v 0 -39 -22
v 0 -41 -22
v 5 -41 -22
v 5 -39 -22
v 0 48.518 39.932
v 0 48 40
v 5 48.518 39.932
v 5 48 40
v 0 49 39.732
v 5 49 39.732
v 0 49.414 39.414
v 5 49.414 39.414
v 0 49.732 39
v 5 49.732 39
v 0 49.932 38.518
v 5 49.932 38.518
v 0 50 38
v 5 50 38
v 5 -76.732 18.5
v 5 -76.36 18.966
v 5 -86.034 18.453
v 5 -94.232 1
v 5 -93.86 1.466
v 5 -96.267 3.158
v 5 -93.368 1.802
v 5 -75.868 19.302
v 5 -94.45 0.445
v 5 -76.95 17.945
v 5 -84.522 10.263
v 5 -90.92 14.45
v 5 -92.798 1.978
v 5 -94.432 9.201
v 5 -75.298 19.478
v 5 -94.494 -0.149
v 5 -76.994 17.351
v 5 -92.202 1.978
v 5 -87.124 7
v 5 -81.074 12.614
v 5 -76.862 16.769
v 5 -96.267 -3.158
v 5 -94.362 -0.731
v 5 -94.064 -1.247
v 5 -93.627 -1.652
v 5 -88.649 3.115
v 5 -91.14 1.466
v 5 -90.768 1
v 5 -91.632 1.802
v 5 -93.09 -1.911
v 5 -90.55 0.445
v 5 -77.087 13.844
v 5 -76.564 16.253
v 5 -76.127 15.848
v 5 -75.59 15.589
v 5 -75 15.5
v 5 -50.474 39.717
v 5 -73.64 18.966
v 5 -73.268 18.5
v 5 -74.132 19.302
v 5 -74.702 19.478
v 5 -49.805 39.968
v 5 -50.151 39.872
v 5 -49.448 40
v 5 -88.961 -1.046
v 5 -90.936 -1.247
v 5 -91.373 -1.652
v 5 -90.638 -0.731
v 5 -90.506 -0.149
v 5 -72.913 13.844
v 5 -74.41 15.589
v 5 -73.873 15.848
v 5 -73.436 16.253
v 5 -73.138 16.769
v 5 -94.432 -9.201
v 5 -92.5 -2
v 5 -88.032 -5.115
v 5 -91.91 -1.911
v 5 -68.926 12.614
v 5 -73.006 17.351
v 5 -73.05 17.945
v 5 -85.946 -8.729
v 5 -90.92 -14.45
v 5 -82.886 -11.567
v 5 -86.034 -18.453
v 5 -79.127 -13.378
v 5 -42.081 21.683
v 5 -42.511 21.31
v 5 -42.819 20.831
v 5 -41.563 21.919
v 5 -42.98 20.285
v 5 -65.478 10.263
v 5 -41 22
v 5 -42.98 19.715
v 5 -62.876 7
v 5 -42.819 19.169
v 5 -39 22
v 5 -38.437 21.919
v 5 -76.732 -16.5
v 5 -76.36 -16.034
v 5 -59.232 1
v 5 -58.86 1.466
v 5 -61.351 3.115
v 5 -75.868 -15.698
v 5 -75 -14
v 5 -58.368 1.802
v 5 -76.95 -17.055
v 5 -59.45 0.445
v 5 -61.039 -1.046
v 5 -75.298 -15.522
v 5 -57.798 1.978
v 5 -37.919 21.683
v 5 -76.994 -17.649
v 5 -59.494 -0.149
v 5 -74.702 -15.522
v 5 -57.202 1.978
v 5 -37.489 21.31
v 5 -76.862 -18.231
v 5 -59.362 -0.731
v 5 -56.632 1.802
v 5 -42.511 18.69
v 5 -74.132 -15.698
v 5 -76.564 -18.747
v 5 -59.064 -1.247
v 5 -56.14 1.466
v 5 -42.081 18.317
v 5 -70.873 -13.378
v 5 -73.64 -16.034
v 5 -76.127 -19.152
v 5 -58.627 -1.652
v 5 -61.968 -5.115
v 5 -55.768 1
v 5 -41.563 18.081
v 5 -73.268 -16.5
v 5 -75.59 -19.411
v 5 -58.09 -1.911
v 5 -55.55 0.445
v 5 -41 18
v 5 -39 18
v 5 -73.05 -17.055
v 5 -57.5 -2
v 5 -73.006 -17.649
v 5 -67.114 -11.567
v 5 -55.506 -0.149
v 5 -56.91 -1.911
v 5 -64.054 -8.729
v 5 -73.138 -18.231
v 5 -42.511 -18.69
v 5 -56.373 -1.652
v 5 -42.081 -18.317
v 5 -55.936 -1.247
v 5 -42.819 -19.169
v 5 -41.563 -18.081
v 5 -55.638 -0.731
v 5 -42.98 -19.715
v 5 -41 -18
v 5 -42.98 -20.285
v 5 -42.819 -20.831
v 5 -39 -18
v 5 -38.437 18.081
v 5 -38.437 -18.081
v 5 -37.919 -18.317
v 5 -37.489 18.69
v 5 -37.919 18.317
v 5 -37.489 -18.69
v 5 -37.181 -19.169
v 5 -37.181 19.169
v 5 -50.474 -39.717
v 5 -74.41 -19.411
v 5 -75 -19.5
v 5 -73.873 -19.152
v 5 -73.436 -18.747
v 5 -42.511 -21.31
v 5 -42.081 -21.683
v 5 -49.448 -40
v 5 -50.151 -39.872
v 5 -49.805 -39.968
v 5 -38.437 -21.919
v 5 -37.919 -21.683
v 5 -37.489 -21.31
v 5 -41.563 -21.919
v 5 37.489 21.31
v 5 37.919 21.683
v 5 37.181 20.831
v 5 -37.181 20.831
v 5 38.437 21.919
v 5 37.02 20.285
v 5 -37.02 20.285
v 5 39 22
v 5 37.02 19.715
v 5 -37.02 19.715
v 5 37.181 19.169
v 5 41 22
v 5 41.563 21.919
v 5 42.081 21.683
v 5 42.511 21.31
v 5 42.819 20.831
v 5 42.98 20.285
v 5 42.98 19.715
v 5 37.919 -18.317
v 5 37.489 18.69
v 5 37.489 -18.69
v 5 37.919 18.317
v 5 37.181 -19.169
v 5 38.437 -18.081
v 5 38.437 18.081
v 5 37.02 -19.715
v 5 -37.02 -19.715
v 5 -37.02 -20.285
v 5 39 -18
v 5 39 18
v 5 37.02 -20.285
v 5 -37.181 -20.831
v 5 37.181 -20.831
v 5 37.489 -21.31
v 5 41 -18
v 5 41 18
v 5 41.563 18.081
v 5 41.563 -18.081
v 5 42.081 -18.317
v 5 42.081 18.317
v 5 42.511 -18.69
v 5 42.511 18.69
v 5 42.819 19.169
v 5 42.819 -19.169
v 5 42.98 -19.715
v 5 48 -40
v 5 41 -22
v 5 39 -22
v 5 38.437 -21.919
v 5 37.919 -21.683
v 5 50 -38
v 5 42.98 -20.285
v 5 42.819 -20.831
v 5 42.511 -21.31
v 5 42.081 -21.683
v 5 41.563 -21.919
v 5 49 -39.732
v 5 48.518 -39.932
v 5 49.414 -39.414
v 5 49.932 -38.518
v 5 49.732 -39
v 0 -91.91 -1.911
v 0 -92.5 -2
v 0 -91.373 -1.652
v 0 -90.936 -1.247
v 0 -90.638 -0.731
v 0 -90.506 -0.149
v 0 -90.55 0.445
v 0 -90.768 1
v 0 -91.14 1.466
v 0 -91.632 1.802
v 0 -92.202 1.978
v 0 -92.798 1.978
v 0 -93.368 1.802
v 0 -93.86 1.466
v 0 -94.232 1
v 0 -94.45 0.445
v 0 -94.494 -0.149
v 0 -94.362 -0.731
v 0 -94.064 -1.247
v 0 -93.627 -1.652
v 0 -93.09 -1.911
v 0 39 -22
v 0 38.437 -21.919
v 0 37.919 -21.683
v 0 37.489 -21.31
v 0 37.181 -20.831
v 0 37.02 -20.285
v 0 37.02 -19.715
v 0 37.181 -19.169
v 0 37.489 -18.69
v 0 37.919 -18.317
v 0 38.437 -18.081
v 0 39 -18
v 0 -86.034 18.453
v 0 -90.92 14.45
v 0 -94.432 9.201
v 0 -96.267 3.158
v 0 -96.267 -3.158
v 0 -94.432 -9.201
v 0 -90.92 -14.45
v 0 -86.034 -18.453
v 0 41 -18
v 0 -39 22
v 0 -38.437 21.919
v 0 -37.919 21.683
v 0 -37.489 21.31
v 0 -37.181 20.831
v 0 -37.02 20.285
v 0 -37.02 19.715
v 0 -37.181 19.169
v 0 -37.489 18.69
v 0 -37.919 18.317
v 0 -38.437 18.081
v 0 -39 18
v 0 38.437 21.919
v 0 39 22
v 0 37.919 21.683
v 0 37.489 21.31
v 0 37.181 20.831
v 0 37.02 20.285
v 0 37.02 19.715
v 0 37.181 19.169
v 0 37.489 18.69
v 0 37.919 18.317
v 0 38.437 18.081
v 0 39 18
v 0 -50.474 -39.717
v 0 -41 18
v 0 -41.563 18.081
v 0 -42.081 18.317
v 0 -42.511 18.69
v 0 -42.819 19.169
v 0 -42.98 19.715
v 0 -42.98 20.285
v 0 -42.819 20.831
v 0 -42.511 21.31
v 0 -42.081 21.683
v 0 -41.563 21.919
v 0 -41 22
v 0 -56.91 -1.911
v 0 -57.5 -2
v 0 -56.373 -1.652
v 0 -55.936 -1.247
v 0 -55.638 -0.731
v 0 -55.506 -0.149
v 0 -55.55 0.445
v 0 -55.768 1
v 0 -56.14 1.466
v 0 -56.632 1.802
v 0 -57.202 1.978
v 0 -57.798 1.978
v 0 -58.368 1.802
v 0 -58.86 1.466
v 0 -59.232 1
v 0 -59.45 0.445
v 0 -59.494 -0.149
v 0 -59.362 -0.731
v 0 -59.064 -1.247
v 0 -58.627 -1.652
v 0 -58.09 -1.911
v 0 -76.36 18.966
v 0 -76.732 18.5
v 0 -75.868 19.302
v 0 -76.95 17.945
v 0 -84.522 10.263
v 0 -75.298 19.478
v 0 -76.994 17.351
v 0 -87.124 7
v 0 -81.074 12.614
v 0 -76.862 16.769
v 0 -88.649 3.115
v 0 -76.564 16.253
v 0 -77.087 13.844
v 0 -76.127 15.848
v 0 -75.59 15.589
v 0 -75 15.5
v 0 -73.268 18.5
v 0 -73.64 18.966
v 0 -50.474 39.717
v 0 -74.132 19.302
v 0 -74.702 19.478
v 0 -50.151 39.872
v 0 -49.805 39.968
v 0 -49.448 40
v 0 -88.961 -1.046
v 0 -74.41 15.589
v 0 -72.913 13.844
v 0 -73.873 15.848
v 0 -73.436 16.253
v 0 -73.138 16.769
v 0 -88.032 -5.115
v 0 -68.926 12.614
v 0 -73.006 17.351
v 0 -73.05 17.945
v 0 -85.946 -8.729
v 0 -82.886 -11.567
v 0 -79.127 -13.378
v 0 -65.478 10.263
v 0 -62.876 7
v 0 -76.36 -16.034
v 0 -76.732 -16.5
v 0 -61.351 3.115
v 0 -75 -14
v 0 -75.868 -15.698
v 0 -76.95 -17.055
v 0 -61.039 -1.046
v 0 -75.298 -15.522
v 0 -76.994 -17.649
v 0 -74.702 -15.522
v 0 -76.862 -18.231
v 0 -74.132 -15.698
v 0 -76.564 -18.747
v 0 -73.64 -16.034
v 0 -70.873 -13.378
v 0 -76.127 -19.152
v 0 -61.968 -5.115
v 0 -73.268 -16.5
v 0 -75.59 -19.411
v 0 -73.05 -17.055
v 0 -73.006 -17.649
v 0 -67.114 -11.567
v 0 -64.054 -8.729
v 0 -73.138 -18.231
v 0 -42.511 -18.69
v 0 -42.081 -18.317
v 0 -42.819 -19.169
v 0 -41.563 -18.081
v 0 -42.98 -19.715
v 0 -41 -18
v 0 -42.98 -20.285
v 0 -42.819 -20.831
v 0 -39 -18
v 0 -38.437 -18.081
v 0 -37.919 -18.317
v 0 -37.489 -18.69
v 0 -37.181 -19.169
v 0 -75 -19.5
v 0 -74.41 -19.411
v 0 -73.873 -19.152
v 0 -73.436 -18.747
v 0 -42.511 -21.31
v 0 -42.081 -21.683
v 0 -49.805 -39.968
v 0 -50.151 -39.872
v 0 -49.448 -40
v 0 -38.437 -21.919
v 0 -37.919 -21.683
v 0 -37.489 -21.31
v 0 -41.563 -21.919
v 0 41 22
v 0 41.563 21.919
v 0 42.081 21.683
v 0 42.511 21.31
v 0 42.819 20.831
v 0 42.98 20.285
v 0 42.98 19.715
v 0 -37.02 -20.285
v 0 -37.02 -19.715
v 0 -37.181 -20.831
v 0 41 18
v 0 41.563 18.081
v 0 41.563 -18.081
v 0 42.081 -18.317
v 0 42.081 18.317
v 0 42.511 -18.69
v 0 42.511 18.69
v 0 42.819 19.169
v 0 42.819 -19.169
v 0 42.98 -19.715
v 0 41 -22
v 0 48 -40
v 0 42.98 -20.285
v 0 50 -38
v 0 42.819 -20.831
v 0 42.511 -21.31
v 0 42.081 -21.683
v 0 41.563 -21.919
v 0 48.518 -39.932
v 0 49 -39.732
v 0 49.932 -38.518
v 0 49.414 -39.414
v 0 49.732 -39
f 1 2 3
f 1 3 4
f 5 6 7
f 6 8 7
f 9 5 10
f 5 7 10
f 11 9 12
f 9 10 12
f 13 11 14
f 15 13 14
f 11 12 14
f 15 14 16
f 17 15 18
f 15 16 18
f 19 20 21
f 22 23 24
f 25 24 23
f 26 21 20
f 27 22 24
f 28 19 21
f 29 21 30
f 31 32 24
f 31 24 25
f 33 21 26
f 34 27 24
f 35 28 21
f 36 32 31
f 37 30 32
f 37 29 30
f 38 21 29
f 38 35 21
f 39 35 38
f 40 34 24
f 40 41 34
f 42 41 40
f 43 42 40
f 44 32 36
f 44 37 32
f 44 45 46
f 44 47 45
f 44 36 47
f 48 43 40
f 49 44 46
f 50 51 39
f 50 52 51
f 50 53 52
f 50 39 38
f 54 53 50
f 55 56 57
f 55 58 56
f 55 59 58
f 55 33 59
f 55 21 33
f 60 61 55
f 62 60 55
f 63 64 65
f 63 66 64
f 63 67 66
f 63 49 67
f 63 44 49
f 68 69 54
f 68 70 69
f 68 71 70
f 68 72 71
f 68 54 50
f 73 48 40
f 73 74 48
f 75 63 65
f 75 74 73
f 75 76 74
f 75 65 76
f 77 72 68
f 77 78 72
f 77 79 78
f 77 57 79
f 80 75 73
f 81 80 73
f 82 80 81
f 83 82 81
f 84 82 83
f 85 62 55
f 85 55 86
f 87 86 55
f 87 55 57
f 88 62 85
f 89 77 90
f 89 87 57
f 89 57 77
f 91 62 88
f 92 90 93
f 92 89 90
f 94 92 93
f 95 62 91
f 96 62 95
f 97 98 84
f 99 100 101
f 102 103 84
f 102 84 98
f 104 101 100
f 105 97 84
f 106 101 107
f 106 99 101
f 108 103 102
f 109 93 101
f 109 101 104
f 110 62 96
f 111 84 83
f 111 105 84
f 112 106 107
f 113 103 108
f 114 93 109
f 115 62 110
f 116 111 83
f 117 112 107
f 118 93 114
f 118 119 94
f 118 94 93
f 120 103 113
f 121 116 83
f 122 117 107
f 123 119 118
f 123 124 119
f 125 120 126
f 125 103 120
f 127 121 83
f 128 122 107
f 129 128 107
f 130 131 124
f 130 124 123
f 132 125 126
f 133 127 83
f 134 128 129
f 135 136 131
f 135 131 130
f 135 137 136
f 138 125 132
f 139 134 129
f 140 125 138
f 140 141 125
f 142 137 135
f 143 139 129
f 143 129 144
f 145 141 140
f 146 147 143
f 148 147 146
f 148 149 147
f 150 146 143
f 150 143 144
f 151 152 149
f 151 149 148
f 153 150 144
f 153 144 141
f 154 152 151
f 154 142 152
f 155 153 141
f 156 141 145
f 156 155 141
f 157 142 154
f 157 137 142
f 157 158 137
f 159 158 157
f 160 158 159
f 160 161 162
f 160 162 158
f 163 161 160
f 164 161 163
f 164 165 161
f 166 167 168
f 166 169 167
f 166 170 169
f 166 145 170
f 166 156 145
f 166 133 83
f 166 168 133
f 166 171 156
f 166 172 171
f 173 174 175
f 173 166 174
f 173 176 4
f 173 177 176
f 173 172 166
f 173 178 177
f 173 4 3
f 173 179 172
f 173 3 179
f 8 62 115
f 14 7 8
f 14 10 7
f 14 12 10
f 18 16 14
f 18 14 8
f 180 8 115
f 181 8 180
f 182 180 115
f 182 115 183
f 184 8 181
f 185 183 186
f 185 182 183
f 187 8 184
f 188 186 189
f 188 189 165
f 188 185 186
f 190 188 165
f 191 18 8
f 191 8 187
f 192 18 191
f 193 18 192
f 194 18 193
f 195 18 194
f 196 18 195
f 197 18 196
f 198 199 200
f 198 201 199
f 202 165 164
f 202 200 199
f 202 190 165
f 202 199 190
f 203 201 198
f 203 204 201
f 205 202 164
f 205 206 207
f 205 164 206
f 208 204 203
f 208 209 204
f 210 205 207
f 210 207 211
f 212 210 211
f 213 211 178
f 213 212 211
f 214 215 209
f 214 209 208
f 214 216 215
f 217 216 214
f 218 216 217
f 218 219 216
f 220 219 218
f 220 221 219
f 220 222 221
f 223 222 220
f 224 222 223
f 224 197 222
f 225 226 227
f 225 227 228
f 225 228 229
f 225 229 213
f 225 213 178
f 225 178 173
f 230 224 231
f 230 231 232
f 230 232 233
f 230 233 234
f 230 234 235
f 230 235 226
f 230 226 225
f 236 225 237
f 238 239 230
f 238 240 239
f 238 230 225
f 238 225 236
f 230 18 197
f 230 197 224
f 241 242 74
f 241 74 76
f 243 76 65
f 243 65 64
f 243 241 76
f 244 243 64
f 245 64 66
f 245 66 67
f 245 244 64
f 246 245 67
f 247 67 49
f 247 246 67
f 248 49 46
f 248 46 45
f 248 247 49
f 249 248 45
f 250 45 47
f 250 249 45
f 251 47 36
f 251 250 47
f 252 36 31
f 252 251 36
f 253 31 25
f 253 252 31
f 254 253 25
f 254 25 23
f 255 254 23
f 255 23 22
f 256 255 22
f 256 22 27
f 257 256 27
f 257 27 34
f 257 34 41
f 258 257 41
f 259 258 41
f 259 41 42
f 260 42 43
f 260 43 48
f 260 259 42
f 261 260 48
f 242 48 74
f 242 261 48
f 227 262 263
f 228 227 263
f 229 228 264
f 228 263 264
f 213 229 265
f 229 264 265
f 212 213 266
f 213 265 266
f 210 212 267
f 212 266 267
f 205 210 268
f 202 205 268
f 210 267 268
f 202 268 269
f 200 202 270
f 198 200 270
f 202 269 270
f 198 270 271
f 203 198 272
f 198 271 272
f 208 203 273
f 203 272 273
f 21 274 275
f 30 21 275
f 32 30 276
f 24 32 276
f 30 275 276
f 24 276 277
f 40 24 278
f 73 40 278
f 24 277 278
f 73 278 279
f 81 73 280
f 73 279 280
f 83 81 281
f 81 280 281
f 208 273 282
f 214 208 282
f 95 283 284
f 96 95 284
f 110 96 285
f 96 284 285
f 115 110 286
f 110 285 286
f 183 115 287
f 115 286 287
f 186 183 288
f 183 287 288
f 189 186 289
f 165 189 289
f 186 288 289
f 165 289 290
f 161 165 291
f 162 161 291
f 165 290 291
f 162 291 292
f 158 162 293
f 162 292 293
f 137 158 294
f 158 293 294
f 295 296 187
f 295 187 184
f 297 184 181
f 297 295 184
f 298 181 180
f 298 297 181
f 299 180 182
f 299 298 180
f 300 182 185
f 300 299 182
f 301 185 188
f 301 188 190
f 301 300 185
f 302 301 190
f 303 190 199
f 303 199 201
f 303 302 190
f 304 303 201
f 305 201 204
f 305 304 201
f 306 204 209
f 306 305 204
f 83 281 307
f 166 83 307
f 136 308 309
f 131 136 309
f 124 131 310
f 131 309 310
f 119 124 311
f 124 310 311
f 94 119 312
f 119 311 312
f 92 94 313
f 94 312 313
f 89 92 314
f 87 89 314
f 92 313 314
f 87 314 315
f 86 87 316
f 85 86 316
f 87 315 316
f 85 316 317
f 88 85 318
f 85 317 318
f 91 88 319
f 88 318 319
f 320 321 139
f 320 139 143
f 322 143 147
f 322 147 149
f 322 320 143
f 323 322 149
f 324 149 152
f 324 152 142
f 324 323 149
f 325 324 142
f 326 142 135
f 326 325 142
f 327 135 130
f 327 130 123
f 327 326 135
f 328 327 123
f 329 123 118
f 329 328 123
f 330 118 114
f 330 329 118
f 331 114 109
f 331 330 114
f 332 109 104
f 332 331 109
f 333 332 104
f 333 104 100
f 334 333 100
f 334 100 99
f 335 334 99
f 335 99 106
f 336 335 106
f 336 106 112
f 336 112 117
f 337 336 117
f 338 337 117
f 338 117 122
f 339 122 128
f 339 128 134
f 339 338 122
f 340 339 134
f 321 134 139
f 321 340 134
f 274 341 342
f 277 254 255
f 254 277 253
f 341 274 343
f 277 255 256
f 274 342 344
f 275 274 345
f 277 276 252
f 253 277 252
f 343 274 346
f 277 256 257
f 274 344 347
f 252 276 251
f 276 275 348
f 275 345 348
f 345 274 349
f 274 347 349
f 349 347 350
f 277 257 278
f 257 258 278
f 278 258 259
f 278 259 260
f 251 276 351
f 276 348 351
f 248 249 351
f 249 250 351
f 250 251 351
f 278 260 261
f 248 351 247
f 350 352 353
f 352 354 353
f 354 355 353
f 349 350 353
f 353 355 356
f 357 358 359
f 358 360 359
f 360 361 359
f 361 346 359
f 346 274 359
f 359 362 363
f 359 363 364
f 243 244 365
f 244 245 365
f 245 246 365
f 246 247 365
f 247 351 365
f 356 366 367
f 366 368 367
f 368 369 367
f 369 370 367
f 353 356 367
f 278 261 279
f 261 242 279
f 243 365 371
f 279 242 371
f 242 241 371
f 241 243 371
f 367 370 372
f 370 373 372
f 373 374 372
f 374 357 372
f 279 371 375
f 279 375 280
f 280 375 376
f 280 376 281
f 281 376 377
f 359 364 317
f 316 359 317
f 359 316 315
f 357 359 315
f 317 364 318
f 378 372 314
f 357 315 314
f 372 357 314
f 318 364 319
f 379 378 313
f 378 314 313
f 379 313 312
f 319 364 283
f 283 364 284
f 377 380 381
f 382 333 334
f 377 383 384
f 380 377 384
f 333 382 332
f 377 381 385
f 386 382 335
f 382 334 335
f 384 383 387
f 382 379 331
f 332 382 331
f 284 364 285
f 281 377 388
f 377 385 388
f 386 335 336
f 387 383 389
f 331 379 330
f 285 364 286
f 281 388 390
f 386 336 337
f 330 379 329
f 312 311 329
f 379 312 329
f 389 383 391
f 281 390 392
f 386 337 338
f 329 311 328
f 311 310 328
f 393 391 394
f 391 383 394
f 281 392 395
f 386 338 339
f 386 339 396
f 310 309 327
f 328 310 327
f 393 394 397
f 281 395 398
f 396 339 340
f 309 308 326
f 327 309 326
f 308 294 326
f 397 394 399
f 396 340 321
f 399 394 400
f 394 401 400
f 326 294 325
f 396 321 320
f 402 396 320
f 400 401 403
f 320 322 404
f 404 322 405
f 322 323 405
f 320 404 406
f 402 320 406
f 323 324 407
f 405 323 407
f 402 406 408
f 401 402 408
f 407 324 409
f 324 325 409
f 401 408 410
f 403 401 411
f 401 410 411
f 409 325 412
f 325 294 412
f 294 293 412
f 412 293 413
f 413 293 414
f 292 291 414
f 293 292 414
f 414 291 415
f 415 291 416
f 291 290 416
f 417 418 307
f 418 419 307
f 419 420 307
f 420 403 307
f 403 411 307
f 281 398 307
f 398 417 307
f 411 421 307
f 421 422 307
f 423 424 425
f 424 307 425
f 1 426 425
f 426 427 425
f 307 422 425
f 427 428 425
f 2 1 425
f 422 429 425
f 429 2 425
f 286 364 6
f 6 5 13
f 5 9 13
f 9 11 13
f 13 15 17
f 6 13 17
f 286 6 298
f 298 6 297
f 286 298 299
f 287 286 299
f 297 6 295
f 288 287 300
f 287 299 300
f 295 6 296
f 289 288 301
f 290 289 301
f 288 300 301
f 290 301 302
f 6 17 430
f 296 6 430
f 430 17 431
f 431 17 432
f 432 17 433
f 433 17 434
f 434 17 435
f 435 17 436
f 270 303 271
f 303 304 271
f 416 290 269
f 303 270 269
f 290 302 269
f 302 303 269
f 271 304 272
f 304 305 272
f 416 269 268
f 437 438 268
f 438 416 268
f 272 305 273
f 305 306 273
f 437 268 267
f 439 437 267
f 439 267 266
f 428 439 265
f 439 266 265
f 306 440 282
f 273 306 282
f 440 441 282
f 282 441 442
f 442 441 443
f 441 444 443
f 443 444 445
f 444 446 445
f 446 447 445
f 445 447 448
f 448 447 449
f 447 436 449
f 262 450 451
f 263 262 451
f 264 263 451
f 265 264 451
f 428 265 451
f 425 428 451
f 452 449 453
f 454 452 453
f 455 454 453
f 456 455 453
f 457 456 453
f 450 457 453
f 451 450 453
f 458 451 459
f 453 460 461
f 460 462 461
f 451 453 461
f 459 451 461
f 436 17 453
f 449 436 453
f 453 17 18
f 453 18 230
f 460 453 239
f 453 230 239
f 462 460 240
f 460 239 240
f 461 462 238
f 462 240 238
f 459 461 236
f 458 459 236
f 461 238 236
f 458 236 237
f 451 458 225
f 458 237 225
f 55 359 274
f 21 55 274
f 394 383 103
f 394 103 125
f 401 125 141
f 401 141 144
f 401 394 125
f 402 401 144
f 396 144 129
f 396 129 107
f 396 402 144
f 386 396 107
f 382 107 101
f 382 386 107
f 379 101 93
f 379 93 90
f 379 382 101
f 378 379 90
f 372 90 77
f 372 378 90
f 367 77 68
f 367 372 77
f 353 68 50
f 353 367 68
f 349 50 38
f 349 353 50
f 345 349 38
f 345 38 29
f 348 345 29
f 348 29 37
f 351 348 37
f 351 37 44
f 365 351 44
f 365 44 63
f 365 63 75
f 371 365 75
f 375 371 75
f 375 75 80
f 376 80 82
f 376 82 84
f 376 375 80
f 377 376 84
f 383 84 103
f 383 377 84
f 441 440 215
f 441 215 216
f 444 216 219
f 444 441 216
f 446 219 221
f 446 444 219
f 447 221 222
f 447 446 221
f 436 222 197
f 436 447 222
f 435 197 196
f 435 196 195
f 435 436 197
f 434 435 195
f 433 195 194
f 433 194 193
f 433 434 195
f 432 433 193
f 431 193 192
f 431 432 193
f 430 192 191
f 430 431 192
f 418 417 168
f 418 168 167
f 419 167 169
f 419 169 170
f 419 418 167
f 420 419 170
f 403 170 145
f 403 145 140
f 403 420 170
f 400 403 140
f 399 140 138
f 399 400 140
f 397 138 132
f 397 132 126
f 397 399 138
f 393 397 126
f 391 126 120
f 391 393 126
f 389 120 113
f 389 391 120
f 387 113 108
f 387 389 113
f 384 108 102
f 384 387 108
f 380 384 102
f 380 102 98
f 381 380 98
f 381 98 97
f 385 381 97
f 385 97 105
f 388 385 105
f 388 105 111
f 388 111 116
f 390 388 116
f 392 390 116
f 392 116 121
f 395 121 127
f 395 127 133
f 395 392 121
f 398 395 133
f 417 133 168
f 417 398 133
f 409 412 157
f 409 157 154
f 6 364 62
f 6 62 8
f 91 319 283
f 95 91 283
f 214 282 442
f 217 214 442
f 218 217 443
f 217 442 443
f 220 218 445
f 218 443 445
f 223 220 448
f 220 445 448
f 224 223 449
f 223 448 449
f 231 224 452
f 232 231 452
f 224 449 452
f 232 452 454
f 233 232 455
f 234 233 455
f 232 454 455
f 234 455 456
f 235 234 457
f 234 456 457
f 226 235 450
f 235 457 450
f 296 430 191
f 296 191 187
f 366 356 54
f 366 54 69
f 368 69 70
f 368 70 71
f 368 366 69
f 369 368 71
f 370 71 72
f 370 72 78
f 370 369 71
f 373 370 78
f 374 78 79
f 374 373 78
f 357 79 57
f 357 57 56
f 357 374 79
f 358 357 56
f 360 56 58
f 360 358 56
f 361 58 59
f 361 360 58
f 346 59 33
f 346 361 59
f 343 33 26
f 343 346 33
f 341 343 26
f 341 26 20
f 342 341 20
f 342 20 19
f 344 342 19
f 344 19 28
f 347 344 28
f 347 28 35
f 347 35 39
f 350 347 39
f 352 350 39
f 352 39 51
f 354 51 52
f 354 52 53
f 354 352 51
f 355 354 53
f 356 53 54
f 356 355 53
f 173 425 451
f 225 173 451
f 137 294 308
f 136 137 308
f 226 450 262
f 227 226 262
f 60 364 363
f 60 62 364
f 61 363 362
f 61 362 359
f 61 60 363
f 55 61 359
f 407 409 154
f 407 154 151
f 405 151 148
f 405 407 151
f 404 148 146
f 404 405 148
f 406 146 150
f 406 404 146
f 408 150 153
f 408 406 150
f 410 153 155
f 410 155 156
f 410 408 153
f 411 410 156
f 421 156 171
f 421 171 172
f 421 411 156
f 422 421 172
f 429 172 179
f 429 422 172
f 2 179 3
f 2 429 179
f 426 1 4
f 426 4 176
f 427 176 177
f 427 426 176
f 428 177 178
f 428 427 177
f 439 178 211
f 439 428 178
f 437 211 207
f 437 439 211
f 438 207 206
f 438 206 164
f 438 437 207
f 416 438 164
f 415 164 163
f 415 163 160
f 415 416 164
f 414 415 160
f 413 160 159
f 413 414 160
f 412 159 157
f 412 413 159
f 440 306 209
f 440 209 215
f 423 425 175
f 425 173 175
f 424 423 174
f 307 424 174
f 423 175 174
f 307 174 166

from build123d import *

# Parameters (mm, degrees)
SKETCH1_W           = 80
SKETCH1_H           = 100
SKETCH1_R           = 21.5
SKETCH1_R_2         = 14
SKETCH1_R_3         = 2
BOSS_EXTRUDE1_DEPTH = 5
FILLET1_R           = 2


with BuildPart() as part:
    # Sketch1 → Boss-Extrude1 (new body)
    with BuildSketch(Plane(origin=(0, 0, 0), x_dir=(0, 0, -1), z_dir=(1, 0, 0))):
        Rectangle(SKETCH1_W, SKETCH1_H)
        with BuildLine():
            ThreePointArc((22, -39), (20, -37), (18, -39))
            Line((18, -39), (18, -41))
            ThreePointArc((18, -41), (20, -43), (22, -41))
            Line((22, -41), (22, -39))
        make_face(mode=Mode.SUBTRACT)
        with BuildLine():
            ThreePointArc((-22, 39), (-20, 37), (-18, 39))
            Line((-18, 39), (-18, 41))
            ThreePointArc((-18, 41), (-20, 43), (-22, 41))
            Line((-22, 41), (-22, 39))
        make_face(mode=Mode.SUBTRACT)
        with BuildLine():
            Line((22, 41), (22, 39))
            ThreePointArc((22, 39), (20, 37), (18, 39))
            Line((18, 39), (18, 41))
            ThreePointArc((18, 41), (20, 43), (22, 41))
        make_face(mode=Mode.SUBTRACT)
        with BuildLine():
            Line((-22, -41), (-22, -39))
            ThreePointArc((-22, -39), (-20, -37), (-18, -39))
            Line((-18, -39), (-18, -41))
            ThreePointArc((-18, -41), (-20, -43), (-22, -41))
        make_face(mode=Mode.SUBTRACT)
        with BuildLine():
            Line((40, -50), (-40, -50))
            Line((-40, -50), (-18.452584301, -86.034134882))
            ThreePointArc((-18.452584301, -86.034134882), (-5.72361064, -54.275852702), (21.5, -75))
            ThreePointArc((21.5, -75), (20.724147298, -80.72361064), (18.452584301, -86.034134882))
            Line((18.452584301, -86.034134882), (40, -50))
        make_face()
        with Locations((0, -75)):
            Circle(SKETCH1_R)
        with Locations((0, -75)):
            Circle(SKETCH1_R_2, mode=Mode.SUBTRACT)
        with Locations((17.5, -75)):
            Circle(SKETCH1_R_3, mode=Mode.SUBTRACT)
        with Locations((0, -92.5)):
            Circle(SKETCH1_R_3, mode=Mode.SUBTRACT)
        with Locations((-17.5, -75)):
            Circle(SKETCH1_R_3, mode=Mode.SUBTRACT)
        with Locations((0, -57.5)):
            Circle(SKETCH1_R_3, mode=Mode.SUBTRACT)
    extrude(amount=BOSS_EXTRUDE1_DEPTH)

    # Fillet1
    fillet1_edges = [part.edges().sort_by_distance(p)[0] for p in [
        (2.5, -50, -40),
        (2.5, -50, 40),
        (2.5, 50, 40),
        (2.5, 50, -40),
    ]]
    fillet(fillet1_edges, radius=FILLET1_R)


solid = part.part
